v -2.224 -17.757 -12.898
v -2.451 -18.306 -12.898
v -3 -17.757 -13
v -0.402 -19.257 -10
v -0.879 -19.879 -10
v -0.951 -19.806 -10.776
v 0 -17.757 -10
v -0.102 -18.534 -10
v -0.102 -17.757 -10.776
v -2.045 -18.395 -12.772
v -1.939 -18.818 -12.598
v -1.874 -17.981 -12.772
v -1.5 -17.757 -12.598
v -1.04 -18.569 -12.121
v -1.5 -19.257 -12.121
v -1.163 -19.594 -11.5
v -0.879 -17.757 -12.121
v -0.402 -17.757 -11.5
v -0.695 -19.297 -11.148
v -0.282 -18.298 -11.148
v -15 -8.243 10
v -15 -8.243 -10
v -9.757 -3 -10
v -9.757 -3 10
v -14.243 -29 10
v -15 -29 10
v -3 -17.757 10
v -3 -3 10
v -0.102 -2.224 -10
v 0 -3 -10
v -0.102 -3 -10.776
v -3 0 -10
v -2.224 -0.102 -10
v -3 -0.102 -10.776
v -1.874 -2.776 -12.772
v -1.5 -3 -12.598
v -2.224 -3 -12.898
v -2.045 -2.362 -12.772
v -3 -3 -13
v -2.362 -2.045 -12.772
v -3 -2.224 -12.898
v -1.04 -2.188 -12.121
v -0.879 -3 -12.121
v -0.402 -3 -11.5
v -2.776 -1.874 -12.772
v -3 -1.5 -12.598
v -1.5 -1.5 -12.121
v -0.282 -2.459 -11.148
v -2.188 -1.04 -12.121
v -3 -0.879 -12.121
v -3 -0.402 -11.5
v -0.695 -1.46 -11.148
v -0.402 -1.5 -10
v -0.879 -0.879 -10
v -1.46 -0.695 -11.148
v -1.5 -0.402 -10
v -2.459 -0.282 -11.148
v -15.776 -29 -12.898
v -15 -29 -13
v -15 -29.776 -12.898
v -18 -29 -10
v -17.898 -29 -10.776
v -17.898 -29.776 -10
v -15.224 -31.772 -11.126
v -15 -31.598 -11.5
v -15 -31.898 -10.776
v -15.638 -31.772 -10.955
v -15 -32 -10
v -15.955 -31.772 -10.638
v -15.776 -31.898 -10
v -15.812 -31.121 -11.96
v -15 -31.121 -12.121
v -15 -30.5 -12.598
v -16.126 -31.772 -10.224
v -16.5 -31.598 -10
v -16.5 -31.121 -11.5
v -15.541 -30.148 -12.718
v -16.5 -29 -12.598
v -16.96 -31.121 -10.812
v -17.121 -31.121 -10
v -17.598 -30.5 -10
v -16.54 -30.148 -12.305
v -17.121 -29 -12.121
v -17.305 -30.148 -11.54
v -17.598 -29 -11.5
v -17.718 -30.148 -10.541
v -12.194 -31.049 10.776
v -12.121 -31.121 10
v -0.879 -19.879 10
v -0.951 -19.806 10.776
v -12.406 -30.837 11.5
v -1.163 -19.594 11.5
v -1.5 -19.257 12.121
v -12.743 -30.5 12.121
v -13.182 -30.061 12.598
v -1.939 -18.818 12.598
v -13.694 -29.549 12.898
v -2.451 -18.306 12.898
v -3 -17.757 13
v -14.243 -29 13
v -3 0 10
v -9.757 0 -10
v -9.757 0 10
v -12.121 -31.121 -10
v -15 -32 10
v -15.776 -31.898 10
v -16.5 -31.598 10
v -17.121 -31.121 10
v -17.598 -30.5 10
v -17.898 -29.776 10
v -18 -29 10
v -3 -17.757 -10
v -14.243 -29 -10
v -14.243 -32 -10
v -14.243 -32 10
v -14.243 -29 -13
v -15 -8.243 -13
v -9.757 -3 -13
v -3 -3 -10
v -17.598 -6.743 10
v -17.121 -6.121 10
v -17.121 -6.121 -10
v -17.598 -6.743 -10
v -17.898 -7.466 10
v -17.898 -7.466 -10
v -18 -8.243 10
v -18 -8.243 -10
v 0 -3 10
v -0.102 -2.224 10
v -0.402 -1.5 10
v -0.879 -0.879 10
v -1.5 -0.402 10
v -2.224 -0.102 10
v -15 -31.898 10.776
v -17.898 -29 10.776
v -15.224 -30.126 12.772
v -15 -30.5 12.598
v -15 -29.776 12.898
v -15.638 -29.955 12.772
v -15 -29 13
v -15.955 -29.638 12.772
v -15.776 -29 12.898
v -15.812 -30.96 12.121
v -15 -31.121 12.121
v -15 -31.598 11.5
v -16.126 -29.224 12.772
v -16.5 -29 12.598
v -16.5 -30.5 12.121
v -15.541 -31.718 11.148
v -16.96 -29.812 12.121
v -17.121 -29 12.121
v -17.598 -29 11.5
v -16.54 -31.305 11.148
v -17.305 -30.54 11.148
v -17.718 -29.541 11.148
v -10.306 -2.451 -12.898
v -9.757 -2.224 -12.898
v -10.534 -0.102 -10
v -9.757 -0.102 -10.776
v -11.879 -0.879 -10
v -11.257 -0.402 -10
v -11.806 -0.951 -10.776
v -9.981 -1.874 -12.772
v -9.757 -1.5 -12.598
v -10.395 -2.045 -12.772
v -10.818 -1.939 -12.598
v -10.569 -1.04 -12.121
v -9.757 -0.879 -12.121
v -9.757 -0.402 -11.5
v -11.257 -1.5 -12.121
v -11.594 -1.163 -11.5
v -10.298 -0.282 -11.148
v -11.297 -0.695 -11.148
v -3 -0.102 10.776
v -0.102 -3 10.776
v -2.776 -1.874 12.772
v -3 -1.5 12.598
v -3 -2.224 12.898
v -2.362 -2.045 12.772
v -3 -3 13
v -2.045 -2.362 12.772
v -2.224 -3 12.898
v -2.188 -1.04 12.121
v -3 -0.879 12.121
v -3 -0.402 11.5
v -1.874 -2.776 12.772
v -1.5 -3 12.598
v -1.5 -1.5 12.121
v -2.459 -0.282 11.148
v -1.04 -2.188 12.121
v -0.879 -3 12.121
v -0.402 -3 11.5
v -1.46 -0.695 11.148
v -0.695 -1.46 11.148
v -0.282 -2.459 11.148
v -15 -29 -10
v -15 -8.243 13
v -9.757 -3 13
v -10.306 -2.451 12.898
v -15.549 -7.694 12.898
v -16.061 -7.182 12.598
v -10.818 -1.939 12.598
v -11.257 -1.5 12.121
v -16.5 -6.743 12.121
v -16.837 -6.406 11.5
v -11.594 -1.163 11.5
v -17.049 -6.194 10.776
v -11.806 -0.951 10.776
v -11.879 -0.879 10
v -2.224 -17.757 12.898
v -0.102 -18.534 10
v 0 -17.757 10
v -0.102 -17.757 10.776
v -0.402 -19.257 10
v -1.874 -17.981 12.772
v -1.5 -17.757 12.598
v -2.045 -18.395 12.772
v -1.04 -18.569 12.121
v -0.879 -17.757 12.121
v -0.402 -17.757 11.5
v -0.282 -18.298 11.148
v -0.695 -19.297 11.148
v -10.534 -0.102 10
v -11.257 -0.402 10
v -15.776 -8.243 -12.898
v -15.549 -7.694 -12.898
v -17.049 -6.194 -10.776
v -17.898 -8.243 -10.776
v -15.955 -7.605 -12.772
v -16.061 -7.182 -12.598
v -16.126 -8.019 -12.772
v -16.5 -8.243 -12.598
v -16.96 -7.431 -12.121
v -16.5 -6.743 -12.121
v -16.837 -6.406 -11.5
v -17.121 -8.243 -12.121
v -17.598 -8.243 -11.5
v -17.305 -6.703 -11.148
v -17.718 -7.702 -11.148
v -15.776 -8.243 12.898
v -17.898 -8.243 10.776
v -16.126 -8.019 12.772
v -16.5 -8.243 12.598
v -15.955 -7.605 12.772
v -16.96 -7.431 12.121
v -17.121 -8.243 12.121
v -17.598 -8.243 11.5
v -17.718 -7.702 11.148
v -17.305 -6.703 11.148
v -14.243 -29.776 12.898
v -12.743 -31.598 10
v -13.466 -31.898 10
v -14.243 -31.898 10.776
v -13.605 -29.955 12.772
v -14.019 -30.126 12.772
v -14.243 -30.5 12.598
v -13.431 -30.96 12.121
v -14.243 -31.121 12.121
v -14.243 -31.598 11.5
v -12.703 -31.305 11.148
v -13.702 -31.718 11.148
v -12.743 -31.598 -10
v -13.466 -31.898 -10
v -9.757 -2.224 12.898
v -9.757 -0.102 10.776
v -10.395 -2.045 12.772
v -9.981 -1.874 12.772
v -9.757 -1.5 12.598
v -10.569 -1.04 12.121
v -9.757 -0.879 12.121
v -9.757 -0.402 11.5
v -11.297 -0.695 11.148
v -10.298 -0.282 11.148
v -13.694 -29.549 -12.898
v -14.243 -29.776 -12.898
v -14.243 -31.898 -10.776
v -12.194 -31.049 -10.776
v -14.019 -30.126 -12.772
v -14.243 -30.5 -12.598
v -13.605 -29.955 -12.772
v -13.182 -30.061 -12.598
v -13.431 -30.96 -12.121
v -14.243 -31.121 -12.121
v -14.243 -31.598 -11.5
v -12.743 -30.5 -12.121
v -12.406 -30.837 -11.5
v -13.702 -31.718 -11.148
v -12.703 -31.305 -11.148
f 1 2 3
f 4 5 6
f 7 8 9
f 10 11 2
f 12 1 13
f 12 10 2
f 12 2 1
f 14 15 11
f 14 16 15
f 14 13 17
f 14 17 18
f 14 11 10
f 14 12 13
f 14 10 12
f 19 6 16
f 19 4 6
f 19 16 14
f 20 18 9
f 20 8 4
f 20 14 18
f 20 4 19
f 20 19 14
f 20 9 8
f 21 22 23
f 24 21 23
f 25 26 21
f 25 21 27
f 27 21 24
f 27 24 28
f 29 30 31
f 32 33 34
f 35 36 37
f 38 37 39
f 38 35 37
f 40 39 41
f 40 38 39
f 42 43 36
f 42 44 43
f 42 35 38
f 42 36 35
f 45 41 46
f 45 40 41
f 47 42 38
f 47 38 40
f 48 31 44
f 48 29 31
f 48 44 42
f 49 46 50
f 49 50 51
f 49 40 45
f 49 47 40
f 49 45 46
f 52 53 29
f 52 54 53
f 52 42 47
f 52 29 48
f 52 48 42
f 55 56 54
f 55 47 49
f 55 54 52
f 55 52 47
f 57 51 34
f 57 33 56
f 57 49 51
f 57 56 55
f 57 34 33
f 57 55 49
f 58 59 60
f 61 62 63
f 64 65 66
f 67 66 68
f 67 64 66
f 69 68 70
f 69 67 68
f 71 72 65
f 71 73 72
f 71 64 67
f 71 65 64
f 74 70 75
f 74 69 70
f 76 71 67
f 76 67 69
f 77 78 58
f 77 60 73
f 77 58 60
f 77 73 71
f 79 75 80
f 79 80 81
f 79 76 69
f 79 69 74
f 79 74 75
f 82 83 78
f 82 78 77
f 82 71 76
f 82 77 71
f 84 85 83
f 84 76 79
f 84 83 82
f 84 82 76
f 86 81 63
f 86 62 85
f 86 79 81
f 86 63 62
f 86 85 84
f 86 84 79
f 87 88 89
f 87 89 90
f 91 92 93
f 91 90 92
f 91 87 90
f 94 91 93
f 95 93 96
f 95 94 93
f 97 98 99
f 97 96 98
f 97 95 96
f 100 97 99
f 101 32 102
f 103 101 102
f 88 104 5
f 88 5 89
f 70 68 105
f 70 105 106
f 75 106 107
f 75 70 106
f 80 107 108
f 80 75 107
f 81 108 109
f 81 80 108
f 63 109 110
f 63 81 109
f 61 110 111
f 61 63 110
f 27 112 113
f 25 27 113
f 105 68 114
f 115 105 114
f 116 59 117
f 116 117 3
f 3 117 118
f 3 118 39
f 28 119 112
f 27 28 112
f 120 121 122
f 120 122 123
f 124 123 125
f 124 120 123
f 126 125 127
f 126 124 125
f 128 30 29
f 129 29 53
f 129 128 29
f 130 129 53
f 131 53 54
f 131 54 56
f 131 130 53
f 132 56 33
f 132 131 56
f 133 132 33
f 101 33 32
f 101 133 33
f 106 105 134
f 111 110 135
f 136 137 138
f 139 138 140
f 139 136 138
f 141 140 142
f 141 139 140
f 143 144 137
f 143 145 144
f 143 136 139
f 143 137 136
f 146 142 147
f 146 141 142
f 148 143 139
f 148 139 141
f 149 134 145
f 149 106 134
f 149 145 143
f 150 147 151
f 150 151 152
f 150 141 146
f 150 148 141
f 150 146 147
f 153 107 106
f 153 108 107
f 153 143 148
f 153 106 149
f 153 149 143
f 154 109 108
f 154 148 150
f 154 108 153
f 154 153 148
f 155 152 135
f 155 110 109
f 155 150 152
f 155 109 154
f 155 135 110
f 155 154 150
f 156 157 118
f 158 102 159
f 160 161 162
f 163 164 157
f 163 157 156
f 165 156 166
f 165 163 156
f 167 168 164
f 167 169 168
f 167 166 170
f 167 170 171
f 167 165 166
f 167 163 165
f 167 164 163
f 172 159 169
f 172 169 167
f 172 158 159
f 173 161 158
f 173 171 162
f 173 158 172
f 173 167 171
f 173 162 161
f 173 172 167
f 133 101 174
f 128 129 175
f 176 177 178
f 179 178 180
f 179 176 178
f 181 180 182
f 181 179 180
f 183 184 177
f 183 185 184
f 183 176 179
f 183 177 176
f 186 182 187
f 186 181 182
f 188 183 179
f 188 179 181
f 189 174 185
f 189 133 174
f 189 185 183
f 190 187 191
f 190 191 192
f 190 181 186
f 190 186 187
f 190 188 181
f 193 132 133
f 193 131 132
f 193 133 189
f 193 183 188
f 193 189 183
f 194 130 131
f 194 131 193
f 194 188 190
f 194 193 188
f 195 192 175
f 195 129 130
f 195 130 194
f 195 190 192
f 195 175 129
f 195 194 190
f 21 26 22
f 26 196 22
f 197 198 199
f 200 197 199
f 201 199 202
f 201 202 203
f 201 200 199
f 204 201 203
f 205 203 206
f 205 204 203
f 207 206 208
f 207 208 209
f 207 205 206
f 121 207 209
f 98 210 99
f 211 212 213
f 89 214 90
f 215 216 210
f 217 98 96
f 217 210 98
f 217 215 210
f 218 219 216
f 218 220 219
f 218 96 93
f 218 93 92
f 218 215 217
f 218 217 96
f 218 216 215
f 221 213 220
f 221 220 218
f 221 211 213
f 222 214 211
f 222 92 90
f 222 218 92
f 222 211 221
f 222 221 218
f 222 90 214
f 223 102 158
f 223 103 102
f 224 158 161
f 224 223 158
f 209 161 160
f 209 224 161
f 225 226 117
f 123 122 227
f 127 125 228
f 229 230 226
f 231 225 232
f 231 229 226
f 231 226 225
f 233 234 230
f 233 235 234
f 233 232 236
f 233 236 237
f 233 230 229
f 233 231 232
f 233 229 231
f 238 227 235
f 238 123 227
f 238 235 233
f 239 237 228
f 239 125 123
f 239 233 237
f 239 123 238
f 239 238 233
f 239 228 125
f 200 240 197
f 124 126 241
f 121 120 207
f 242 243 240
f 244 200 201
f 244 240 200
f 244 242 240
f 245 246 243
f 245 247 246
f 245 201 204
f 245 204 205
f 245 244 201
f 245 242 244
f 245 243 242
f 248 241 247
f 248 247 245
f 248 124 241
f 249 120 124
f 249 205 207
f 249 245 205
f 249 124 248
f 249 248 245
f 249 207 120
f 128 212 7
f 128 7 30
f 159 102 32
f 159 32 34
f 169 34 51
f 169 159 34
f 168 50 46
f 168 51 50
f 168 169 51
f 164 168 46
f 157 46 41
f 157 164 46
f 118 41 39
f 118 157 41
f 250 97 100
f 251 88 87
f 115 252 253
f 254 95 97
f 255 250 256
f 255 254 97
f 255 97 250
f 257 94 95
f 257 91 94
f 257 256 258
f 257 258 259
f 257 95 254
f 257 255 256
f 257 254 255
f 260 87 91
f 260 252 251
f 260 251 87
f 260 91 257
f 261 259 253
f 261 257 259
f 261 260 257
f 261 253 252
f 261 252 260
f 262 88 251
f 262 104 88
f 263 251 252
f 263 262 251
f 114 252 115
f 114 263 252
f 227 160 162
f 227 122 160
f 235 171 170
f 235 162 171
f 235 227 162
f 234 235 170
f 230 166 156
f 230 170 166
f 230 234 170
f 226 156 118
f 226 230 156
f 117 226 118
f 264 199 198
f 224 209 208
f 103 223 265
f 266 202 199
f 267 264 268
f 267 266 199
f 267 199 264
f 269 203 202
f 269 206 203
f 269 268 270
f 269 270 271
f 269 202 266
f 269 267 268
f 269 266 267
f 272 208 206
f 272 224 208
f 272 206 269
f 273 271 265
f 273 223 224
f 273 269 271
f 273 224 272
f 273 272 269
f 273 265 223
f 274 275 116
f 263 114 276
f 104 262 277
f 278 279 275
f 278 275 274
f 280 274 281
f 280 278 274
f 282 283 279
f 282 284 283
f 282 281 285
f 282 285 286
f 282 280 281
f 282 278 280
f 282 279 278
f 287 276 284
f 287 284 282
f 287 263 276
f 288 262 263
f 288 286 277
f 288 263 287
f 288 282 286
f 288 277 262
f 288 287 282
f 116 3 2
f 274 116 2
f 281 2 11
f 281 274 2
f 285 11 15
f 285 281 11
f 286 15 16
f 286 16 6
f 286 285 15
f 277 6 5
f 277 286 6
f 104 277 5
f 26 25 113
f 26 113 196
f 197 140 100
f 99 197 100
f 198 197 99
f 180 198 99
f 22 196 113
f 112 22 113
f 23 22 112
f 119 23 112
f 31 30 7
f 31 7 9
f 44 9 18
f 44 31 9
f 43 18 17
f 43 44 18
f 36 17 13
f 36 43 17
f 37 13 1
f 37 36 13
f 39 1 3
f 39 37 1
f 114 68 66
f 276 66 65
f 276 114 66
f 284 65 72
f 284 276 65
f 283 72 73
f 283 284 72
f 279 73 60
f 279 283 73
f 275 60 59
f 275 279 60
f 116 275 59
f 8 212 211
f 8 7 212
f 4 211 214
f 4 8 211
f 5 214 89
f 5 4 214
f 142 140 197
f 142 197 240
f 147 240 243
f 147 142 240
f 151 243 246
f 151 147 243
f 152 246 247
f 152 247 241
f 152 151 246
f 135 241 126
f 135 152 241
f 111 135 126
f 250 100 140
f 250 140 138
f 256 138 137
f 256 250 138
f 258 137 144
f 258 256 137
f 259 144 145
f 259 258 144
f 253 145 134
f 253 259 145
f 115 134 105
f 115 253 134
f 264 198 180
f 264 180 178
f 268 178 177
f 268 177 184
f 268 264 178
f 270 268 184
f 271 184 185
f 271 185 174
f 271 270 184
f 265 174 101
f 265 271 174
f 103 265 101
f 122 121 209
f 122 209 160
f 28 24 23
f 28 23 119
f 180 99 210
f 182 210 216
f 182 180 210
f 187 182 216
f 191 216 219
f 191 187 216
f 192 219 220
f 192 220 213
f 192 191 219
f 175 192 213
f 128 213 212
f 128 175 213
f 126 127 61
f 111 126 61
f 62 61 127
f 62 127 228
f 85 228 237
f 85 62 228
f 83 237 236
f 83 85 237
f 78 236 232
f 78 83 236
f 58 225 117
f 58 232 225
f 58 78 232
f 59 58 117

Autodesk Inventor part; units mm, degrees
ref_plane "YZ Plane" through (0, 0, 0) normal (1, 0, 0) x (0, 1, 0)
ref_plane "XZ Plane" through (0, 0, 0) normal (0, 1, 0) x (-1, 0, 0)
ref_plane "XY Plane" through (0, 0, 0) normal (0, 0, 1) x (1, 0, 0)
sketch "Sketch1" plane through (0, 0, 0) normal (0, 0, 1) x (1, 0, 0)
  line L0 (0, 0) -> (-18, 0)
  line L1 (-18, 0) -> (-18, -32)
  line L2 (-18, -32) -> (0, -32)
  line L3 (0, -32) -> (0, 0)
  dimension "d0" = 18
  dimension "d1" = 32
extrude "Extrusion1" add sketch "Sketch1" along normal mid plane 26
chamfer "Chamfer1" distance 7 angle 45 1 edges at (-18, 0, 0)
chamfer "Chamfer2" distance 13 angle 45 1 edges at (0, -32, 0)
fillet "Fillet1" radius 3 18 edges at (-18, -7, 0) (-11, 0, 0) (0, 0, 0) (0, -9.5, -13) (-5.5, 0, -13) (-14.5, -3.5, -13) (-18, -19.5, -13) (-15.5, -32, -13) (-18, -32, 0) (-15.5, -32, 13) (-18, -19.5, 13) (-14.5, -3.5, 13) (-5.5, 0, 13) (0, -9.5, 13) (0, -19, 0) (-6.5, -25.5, -13) (-13, -32, 0) (-6.5, -25.5, 13)
sketch "Sketch2" plane through (0, 0, 0) normal (0, 0, 1) x (1, 0, 0)
  line L0 (-15, -29) -> (-15, -8.2426) projected
  line L1 (-14.2426, -29) -> (-15, -29) projected
  line L2 (-3, -17.7574) -> (-14.2426, -29) projected
  line L3 (-3, -3) -> (-3, -17.7574) projected
  line L4 (-9.7574, -3) -> (-3, -3) projected
  line L5 (-15, -8.2426) -> (-9.7574, -3) projected
  point P0 (0, 0)
extrude "Extrusion2" cut sketch "Sketch2" along normal mid plane 20
properties part number "Ar620" material "ABS Plastic"
